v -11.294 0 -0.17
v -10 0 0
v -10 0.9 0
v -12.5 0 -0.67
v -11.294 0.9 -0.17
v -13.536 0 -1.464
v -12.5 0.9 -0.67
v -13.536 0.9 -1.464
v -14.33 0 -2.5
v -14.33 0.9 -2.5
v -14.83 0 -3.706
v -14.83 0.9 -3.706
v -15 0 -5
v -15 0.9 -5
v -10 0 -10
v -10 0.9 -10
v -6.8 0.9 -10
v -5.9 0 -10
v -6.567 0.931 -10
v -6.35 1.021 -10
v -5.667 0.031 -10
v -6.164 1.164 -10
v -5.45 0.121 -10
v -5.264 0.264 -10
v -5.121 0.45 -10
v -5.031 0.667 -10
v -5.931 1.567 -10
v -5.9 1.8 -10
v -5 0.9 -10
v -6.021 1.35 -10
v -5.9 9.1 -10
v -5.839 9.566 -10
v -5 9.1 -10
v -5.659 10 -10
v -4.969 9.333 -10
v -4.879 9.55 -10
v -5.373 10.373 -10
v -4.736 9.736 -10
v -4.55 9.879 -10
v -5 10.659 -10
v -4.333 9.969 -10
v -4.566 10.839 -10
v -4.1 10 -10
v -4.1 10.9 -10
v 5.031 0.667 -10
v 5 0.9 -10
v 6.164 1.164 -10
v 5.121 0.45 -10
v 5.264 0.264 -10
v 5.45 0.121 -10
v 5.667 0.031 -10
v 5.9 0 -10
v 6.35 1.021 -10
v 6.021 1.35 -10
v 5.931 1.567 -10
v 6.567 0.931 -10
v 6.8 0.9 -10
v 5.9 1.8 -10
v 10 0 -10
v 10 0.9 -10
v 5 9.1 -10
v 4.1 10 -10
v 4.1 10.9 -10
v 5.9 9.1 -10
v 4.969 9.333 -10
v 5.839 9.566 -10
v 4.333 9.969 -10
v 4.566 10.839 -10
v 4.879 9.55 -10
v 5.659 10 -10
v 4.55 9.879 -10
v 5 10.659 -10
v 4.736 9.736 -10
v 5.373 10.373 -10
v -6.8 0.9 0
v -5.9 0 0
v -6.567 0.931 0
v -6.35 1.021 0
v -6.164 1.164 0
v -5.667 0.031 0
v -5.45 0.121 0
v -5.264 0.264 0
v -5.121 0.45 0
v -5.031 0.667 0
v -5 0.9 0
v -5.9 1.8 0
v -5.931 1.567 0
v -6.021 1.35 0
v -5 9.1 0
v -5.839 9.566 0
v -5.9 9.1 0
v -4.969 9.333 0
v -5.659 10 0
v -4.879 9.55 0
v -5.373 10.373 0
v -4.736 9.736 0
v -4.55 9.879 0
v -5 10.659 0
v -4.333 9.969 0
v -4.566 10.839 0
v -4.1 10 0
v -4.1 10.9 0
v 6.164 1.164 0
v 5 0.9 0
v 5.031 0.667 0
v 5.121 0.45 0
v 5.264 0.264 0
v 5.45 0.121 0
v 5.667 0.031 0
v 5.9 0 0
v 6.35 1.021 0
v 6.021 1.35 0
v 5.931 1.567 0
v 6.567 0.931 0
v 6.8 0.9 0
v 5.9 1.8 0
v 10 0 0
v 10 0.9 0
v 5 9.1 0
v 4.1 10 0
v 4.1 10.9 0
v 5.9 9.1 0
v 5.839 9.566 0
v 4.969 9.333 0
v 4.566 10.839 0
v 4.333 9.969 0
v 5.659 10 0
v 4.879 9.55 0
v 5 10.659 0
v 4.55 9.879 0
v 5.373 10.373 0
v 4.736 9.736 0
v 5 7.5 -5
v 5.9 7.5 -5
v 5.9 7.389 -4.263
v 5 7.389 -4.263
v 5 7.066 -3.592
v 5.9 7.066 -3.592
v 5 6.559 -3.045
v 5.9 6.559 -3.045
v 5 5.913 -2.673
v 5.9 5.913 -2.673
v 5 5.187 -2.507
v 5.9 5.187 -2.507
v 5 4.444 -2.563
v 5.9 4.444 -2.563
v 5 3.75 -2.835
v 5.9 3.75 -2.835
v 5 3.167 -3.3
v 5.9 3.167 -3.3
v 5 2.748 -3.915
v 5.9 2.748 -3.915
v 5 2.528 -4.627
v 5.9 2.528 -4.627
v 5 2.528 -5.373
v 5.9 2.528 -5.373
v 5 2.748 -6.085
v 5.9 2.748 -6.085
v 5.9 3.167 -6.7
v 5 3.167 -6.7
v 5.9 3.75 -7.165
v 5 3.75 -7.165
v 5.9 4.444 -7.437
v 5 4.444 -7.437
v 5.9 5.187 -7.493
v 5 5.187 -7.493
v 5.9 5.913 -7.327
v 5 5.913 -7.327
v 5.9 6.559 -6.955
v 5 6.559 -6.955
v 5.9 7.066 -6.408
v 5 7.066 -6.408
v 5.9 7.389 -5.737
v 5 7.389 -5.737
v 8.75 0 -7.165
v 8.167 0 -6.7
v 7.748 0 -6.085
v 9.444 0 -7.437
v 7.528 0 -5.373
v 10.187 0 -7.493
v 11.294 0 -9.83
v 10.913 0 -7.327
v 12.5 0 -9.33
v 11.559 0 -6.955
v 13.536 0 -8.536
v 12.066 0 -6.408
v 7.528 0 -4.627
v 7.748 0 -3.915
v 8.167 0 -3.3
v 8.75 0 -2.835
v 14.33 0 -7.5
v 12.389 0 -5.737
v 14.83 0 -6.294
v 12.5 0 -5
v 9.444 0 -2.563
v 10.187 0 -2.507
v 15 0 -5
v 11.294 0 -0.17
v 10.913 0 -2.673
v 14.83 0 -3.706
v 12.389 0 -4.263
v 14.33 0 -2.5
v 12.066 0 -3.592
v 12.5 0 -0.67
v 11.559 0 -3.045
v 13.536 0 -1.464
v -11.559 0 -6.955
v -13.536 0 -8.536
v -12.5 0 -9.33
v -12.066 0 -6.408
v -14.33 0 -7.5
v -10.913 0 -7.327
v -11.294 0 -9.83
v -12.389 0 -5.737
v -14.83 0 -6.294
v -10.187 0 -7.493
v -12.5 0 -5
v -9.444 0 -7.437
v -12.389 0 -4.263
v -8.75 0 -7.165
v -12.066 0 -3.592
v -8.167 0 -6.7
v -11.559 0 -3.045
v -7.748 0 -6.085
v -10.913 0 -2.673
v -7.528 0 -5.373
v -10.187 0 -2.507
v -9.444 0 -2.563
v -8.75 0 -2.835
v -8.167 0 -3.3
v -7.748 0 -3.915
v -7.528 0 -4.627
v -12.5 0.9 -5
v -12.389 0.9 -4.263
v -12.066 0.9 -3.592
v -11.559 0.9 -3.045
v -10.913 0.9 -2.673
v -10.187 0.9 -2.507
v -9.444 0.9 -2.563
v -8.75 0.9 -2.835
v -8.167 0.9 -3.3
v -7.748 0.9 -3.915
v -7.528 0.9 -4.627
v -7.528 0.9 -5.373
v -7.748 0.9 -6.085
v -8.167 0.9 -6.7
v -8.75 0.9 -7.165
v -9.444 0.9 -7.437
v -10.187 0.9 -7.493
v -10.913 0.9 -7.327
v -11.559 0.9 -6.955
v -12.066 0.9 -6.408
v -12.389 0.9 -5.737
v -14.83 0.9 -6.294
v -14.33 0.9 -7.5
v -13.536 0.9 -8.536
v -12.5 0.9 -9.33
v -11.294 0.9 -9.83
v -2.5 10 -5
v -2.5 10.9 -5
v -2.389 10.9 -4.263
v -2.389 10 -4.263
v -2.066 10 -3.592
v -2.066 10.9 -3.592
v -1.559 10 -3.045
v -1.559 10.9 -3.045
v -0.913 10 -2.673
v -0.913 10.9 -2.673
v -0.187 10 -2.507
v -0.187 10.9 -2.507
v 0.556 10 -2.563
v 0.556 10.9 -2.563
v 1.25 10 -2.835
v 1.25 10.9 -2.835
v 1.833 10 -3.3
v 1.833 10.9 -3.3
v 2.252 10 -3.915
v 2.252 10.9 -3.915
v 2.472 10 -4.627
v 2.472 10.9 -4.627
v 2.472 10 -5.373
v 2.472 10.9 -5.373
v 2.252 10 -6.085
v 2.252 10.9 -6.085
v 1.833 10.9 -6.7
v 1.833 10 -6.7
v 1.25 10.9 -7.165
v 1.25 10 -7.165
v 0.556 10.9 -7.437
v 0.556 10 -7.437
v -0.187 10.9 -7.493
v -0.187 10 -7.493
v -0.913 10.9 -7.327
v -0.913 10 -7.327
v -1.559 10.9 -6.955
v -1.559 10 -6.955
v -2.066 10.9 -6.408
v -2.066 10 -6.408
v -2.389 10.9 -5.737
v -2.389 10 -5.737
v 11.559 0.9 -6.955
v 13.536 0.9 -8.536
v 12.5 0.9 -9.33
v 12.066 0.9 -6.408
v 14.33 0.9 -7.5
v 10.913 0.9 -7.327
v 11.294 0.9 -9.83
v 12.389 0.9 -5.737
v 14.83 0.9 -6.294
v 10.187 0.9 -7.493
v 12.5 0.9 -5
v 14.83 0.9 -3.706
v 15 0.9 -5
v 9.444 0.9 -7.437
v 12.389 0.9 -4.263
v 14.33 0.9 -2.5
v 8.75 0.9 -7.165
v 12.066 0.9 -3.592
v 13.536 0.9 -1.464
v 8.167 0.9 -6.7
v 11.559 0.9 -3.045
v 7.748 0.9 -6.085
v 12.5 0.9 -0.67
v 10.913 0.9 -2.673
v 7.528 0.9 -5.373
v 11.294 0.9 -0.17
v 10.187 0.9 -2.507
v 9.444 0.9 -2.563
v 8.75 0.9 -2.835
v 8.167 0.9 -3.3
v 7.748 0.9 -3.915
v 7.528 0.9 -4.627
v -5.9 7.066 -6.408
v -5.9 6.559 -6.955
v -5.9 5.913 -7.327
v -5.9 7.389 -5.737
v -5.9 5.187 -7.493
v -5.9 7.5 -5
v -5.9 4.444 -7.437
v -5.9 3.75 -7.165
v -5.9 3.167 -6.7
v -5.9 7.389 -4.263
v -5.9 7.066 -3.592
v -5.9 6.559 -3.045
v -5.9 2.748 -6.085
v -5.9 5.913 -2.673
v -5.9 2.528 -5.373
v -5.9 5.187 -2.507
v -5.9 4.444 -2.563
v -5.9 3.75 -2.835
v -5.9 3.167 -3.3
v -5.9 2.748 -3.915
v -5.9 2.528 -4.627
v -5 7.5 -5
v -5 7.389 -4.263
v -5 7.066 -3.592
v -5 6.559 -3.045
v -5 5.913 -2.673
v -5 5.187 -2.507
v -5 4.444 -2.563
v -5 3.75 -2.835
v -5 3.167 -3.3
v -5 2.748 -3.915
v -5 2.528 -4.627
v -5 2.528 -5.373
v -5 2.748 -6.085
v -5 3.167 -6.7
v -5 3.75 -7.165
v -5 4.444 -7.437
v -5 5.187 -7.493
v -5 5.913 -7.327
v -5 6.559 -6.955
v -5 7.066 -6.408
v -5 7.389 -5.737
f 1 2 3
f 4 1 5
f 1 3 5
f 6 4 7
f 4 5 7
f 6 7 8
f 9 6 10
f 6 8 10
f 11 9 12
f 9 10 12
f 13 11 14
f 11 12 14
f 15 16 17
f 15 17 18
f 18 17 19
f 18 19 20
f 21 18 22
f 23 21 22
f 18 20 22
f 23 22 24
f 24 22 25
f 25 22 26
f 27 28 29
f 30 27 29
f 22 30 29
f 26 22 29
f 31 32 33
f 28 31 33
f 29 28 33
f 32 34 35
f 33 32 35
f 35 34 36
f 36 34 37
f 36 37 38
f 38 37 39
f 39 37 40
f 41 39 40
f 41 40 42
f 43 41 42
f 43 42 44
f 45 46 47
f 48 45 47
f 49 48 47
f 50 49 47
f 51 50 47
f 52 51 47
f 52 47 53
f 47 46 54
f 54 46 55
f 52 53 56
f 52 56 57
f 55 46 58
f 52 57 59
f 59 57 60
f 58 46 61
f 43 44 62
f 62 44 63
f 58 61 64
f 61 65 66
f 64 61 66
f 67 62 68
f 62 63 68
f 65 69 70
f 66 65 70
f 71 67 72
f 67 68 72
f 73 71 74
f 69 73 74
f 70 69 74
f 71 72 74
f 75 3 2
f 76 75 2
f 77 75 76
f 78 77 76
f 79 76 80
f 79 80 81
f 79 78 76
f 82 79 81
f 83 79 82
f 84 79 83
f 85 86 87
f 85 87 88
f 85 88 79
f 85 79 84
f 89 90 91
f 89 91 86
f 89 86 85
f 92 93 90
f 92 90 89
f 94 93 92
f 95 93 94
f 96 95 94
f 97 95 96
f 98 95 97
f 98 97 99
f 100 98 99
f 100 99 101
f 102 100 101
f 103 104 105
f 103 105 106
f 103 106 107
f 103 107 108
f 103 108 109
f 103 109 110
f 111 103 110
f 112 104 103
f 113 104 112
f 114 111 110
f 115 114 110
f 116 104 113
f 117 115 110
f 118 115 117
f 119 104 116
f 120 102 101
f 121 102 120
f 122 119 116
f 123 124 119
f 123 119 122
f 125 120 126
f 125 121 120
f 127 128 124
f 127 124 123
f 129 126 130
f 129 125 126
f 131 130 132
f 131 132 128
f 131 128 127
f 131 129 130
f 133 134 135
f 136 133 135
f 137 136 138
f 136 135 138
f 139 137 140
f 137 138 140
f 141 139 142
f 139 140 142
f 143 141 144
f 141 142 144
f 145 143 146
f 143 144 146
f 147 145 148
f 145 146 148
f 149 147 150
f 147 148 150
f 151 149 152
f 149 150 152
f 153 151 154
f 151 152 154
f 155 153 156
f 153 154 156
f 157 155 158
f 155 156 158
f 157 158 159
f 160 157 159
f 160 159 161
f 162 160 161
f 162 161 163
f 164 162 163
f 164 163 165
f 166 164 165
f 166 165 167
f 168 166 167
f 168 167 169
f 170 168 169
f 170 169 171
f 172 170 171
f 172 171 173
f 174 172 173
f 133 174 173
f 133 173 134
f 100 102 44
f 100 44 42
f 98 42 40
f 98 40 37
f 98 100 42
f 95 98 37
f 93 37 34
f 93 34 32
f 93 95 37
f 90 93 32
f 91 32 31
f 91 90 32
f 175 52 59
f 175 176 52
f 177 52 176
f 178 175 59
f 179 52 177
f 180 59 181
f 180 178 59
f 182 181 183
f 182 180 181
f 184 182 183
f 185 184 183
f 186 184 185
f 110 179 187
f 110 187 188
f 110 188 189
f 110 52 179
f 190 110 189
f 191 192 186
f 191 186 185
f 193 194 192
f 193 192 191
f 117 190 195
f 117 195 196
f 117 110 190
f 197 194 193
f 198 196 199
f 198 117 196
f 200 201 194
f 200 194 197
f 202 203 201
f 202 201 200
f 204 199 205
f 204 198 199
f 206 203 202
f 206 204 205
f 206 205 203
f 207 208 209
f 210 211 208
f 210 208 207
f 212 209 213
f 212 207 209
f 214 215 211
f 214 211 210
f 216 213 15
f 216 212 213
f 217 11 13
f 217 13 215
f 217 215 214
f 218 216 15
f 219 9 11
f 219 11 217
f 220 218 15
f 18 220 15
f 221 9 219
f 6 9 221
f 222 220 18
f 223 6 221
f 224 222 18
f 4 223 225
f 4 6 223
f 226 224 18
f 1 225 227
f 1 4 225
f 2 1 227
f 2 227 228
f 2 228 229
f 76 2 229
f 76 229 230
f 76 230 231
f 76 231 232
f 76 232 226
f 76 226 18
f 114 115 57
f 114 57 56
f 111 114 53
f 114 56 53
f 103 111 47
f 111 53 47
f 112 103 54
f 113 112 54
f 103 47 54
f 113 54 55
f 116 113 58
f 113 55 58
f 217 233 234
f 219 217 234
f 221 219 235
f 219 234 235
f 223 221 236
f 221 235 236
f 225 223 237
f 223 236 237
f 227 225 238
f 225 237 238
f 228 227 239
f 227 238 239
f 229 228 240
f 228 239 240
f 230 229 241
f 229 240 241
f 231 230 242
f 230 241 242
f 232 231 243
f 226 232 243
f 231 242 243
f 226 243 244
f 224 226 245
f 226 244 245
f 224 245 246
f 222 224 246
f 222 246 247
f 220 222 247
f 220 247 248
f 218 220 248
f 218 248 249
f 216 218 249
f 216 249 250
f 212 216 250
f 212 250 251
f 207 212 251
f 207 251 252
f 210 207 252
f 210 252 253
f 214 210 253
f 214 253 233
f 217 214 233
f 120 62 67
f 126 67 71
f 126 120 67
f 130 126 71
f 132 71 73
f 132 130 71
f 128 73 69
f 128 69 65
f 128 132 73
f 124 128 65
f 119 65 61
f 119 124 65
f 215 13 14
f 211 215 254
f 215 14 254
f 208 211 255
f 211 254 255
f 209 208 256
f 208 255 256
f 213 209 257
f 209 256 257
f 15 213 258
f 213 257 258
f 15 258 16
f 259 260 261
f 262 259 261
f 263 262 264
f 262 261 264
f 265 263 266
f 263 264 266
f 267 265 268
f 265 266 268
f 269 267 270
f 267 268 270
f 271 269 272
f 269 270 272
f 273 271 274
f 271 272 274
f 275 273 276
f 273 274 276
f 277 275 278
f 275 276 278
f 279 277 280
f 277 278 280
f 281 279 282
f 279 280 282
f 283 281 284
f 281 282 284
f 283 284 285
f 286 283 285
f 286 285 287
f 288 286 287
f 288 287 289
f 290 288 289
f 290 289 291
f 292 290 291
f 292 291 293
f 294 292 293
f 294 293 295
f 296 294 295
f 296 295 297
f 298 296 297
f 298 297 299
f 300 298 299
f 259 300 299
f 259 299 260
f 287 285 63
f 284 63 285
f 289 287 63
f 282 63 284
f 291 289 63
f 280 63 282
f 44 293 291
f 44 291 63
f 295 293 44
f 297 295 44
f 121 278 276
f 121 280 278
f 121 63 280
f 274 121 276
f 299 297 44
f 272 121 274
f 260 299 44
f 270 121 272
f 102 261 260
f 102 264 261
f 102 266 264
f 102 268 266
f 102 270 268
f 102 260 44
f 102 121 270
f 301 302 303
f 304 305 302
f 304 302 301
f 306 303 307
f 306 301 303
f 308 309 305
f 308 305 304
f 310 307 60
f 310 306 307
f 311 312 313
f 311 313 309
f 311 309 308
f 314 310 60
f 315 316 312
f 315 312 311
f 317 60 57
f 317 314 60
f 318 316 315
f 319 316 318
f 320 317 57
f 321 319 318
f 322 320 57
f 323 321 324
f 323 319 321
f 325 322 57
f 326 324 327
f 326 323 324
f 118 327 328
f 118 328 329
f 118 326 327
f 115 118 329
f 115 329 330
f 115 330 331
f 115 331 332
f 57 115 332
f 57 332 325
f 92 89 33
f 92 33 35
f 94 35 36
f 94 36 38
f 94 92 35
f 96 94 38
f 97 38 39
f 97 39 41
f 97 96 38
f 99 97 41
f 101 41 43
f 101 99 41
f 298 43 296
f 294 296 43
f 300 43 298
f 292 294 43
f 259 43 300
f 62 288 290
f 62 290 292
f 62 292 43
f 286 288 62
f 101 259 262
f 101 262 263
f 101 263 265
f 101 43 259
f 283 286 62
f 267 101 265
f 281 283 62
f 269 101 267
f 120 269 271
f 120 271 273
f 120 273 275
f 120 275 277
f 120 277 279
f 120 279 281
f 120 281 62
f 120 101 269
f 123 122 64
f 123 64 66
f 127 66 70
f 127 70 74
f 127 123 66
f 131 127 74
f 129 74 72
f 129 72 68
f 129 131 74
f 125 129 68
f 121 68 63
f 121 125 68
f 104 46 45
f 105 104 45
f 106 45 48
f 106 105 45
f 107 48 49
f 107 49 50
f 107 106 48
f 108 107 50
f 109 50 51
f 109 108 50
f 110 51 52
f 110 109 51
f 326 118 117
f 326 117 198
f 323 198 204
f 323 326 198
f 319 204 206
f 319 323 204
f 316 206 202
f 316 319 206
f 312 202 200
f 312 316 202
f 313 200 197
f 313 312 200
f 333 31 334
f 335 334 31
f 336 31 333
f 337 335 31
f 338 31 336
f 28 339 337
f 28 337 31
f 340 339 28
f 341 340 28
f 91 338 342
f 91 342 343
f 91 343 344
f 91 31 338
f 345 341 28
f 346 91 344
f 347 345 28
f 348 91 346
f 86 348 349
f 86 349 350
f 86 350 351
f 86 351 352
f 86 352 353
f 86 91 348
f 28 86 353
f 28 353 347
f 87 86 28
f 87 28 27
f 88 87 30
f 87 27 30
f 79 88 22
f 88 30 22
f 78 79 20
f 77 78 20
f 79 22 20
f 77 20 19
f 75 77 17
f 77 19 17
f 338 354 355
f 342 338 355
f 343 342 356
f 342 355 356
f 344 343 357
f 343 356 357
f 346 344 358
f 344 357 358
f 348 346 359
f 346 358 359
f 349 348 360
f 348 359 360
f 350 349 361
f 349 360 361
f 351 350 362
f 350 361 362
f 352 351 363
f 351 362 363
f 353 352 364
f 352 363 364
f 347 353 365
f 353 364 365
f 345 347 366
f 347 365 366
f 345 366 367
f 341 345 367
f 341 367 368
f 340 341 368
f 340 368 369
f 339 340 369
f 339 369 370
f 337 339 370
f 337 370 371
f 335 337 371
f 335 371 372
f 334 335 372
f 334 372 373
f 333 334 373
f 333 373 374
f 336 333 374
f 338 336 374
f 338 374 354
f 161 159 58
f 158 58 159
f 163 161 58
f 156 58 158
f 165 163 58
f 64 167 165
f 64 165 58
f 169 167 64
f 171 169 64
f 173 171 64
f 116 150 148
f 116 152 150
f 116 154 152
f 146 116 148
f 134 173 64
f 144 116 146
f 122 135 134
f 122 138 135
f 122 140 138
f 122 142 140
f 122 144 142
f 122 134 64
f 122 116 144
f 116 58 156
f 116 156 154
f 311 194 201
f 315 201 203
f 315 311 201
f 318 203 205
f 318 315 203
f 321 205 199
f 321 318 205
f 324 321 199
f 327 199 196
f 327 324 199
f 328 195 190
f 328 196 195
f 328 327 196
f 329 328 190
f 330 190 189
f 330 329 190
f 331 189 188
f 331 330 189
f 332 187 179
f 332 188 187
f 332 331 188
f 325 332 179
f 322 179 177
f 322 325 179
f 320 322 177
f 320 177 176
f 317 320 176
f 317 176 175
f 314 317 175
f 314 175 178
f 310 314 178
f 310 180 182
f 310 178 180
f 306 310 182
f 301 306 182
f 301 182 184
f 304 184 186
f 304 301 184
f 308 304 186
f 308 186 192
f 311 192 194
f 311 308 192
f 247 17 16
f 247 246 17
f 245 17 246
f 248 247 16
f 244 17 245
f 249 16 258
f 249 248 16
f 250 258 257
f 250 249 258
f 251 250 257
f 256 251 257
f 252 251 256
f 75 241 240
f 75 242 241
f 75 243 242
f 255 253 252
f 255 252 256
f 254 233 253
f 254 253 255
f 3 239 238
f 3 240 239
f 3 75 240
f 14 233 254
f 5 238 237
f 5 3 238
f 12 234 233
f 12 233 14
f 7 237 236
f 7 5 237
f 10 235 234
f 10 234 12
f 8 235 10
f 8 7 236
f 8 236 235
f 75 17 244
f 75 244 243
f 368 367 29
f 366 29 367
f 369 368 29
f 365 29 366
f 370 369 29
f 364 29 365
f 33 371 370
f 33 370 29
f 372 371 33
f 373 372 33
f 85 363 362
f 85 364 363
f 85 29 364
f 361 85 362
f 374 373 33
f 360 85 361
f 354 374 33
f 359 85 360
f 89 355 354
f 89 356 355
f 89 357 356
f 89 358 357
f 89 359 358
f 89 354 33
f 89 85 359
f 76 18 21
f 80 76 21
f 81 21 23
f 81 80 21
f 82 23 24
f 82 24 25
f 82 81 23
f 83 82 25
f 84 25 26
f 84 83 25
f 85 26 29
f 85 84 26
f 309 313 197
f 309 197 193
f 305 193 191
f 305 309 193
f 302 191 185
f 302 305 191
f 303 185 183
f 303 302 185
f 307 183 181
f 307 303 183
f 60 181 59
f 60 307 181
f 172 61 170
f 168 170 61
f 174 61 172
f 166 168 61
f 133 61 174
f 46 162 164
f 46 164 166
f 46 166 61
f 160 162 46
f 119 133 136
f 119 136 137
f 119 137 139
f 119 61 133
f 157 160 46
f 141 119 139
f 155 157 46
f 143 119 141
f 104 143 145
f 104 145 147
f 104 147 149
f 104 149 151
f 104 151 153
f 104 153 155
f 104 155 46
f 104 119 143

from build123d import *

# Parameters (mm, degrees)
BASE_FLANGE1_DEPTH = 10
FILLET1_R          = 0.9
SKETCH6_R          = 2.5
CUT_EXTRUDE3_DEPTH = 21.615528128
SKETCH7_R          = 2.5
CUT_EXTRUDE4_DEPTH = 22.066798523
SKETCH8_R          = 2.5
CUT_EXTRUDE5_DEPTH = 26.605077621


# Sheet-metal steps are written as plain solids
with BuildPart() as part:
    # Sketch1 → Base-Flange1 (new body)
    with BuildSketch(Plane.XY):
        with BuildLine():
            Line((-4.1, 10), (4.1, 10))
            ThreePointArc((4.1, 10), (4.736396103, 9.736396103), (5, 9.1))
            Line((5, 9.1), (5, 0.9))
            ThreePointArc((5, 0.9), (5.263603897, 0.263603897), (5.9, 0))
            Line((5.9, 0), (15, 0))
            Line((15, 0), (15, 0.9))
            Line((15, 0.9), (5.9, 0.9))
            Line((5.9, 0.9), (5.9, 9.1))
            ThreePointArc((5.9, 9.1), (5.372792206, 10.372792206), (4.1, 10.9))
            Line((4.1, 10.9), (-4.1, 10.9))
            ThreePointArc((-4.1, 10.9), (-5.372792206, 10.372792206), (-5.9, 9.1))
            Line((-5.9, 9.1), (-5.9, 0.9))
            Line((-5.9, 0.9), (-15, 0.9))
            Line((-15, 0.9), (-15, 0))
            Line((-15, 0), (-5.9, 0))
            ThreePointArc((-5.9, 0), (-5.263603897, 0.263603897), (-5, 0.9))
            Line((-5, 0.9), (-5, 9.1))
            ThreePointArc((-5, 9.1), (-4.736396103, 9.736396103), (-4.1, 10))
        make_face()
    extrude(amount=-BASE_FLANGE1_DEPTH)

    # Fillet1
    fillet1_edges = [part.edges().sort_by_distance(p)[0] for p in [
        (-5.9, 0.9, -5),
        (5.9, 0.9, -5),
    ]]
    fillet(fillet1_edges, radius=FILLET1_R)

    # Sketch6 → Cut-Extrude3 (cut, through all)
    with BuildSketch(Plane(origin=(0, 0.9, 0), x_dir=(1, 0, 0), z_dir=(0, 1, 0))):
        with Locations(Location((-10, 5, 0), (0, 0, 180))):
            Circle(SKETCH6_R)
        with BuildLine():
            Line((-15, 10), (-15, 5))
            ThreePointArc((-15, 5), (-13.535533906, 8.535533906), (-10, 10))
            Line((-10, 10), (-15, 10))
        make_face()
        with BuildLine():
            Line((-15, 0), (-10, 0))
            ThreePointArc((-10, 0), (-13.535533906, 1.464466094), (-15, 5))
            Line((-15, 5), (-15, 0))
        make_face()
    cut_extrude3 = extrude(amount=-CUT_EXTRUDE3_DEPTH, mode=Mode.SUBTRACT)

    # Mirror1: Cut-Extrude3 across plane
    add(cut_extrude3.mirror(Plane(origin=(0, 0, 0), x_dir=(0, 0, 1), z_dir=(1, 0, 0))), mode=Mode.SUBTRACT)

    # Sketch7 → Cut-Extrude4 (cut, through all)
    with BuildSketch(Plane(origin=(0, 10.9, 0), x_dir=(1, 0, 0), z_dir=(0, 1, 0))):
        with Locations(Location((0, 5, 0), (0, 0, 180))):
            Circle(SKETCH7_R)
    extrude(amount=-CUT_EXTRUDE4_DEPTH, mode=Mode.SUBTRACT)

    # Sketch8 → Cut-Extrude5 (cut, through all)
    with BuildSketch(Plane(origin=(5.9, 0, 0), x_dir=(0, 0, -1), z_dir=(1, 0, 0))):
        with Locations(Location((5, 5, 0), (0, 0, 90))):
            Circle(SKETCH8_R)
    extrude(amount=-CUT_EXTRUDE5_DEPTH, mode=Mode.SUBTRACT)


solid = part.part
